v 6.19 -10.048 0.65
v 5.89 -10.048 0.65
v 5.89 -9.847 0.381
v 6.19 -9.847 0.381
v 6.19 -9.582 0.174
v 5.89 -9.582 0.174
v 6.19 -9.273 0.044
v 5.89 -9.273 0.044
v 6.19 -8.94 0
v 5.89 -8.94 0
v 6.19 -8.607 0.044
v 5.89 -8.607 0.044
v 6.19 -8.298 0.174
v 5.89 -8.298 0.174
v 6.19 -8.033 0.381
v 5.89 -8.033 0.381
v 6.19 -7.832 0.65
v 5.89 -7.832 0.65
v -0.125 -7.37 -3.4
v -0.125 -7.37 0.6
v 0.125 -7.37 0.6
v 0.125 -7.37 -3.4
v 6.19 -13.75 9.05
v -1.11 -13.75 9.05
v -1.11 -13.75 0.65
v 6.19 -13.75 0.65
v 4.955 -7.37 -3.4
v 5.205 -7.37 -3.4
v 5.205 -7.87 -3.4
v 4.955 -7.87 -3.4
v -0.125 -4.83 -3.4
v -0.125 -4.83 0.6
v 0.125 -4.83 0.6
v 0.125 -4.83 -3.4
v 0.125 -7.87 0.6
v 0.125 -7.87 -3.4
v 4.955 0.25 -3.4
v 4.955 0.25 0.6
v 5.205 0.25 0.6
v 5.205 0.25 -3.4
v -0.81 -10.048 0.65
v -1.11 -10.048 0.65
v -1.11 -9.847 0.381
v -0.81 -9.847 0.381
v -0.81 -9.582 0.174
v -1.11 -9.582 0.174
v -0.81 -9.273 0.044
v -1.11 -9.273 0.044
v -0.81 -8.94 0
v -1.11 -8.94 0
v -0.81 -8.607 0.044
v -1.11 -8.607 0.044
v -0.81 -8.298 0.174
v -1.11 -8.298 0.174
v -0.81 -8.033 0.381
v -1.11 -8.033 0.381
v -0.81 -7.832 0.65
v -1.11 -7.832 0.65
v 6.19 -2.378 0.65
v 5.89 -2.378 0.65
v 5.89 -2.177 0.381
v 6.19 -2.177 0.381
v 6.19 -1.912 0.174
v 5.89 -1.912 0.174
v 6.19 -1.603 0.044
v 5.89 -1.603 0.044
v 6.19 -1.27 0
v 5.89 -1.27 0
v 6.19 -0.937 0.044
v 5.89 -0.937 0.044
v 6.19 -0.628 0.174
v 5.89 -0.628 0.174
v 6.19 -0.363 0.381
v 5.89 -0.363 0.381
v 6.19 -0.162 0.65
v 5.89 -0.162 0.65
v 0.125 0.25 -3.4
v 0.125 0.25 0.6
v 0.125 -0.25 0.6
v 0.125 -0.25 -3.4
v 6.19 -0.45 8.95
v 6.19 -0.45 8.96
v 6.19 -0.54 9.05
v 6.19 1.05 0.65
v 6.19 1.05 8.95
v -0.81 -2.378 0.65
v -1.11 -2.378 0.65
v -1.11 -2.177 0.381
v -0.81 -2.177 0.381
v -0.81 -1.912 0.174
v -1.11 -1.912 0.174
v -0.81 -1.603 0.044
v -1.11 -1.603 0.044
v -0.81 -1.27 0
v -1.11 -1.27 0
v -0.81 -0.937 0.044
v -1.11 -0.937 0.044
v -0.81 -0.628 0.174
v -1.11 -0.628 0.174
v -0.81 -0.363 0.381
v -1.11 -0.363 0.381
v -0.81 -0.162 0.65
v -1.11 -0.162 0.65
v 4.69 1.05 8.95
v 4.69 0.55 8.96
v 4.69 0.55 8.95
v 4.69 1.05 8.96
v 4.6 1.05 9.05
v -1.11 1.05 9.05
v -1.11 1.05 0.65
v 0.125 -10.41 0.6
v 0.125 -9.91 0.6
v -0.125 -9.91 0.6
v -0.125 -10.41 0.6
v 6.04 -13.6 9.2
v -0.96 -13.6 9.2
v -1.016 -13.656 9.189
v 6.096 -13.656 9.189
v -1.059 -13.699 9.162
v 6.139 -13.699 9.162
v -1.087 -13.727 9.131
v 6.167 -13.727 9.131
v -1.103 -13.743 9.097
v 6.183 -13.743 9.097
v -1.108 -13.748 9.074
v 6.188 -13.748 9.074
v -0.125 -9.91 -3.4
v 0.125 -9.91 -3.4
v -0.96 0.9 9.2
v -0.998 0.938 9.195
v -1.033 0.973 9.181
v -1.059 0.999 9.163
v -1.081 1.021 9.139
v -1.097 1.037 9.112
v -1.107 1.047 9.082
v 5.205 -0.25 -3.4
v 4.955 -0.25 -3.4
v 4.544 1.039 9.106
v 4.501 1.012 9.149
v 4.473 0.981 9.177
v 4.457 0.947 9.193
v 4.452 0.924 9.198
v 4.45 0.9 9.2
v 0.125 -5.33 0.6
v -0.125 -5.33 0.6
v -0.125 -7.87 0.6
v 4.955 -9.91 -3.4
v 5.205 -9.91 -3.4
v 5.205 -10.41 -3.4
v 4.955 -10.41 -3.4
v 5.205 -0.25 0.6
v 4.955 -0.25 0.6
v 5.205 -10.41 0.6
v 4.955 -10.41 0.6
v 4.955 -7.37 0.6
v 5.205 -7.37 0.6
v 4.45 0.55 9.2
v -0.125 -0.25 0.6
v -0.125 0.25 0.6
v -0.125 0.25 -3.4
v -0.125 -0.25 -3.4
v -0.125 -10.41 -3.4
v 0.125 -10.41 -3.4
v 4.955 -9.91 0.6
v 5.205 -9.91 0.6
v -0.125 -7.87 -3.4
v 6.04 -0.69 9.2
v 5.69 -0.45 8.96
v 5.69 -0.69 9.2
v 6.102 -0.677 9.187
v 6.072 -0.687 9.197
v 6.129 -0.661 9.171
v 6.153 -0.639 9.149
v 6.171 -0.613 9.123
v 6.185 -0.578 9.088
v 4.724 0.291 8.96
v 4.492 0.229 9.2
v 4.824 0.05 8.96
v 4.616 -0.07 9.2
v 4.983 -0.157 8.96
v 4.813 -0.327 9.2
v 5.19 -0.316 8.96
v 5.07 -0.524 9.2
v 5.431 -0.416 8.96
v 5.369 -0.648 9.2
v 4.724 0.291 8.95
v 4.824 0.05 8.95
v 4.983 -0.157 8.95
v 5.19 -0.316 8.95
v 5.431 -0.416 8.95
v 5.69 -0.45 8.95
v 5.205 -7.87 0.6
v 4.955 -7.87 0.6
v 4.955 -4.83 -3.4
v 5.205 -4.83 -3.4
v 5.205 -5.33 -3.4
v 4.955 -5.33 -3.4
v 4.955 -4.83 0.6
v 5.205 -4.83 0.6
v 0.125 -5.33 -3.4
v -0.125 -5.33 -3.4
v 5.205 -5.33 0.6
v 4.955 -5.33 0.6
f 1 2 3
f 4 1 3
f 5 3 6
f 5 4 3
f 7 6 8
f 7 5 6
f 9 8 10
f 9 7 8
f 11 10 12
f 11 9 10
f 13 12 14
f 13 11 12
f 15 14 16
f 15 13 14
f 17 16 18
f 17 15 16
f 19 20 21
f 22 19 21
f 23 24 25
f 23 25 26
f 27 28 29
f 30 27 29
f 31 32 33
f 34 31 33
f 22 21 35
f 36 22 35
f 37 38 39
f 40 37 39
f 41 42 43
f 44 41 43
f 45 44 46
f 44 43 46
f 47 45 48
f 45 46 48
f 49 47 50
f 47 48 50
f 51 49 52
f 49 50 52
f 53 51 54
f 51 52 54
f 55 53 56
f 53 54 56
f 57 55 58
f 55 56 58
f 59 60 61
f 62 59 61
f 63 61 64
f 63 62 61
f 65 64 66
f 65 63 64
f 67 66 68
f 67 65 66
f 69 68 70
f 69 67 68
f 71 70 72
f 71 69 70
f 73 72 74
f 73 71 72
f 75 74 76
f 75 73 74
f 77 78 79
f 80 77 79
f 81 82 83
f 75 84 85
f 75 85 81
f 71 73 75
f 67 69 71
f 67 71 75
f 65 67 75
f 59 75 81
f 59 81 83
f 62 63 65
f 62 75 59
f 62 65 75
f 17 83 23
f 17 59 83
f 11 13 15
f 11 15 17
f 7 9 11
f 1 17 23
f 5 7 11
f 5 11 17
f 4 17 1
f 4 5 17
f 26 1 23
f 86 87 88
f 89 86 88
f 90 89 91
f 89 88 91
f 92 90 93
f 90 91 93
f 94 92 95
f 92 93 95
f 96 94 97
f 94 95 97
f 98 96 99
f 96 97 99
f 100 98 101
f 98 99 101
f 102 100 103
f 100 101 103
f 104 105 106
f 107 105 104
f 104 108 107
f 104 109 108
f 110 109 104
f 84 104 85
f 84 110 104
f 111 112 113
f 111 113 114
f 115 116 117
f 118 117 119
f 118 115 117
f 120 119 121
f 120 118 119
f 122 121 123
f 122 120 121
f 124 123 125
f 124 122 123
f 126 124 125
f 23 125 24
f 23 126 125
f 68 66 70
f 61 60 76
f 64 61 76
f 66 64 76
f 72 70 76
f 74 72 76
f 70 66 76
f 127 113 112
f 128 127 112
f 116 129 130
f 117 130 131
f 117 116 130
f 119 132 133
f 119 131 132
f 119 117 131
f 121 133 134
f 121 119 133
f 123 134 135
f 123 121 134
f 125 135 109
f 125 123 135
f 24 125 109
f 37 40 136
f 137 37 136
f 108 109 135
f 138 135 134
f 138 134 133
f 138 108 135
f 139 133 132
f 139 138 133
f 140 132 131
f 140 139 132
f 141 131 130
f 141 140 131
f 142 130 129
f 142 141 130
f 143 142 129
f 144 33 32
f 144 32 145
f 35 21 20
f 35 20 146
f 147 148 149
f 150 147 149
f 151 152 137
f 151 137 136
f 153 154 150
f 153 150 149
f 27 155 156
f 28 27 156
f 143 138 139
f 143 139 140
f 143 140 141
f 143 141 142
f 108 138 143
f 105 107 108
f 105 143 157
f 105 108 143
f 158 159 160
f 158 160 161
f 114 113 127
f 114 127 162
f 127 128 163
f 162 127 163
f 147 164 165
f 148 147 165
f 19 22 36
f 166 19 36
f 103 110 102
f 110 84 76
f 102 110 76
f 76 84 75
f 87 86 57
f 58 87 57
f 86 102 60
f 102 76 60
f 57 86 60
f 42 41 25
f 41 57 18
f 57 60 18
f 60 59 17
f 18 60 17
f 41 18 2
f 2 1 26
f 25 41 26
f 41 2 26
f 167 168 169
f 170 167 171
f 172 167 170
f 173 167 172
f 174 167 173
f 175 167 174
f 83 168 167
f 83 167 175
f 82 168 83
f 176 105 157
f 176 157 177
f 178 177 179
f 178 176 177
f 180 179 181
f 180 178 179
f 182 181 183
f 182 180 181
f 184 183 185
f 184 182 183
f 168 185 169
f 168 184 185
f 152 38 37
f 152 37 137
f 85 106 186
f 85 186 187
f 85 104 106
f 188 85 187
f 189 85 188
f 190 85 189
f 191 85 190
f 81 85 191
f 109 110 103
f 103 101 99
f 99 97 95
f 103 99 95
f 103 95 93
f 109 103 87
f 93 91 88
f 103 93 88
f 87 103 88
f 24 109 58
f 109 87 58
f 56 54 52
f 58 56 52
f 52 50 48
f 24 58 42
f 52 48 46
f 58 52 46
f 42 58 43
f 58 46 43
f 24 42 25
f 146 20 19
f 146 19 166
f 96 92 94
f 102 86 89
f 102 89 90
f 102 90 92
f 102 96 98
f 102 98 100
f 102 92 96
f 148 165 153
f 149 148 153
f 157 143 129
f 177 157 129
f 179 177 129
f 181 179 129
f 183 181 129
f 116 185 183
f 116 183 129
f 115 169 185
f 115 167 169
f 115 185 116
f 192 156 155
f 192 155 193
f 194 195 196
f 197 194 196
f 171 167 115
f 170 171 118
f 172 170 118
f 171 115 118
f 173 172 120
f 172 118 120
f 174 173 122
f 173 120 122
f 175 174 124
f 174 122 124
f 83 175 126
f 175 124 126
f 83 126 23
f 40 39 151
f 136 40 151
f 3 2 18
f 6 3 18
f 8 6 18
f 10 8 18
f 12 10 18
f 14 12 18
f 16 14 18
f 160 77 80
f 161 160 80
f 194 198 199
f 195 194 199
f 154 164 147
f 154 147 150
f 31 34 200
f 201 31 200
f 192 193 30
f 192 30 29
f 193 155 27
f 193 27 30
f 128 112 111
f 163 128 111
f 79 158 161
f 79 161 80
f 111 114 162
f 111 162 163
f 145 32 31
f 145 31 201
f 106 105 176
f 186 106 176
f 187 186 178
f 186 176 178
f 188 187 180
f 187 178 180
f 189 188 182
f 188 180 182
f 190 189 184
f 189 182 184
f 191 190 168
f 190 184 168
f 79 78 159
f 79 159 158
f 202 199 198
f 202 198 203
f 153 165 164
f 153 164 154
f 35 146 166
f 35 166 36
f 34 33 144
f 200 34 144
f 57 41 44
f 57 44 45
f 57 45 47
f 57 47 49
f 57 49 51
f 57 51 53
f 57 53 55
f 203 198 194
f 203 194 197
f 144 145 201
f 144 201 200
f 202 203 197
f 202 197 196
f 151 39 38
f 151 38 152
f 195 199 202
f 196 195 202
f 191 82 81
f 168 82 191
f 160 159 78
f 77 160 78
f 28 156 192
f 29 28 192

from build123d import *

# Parameters (mm, degrees)
PAD002_DEPTH = 0.3
SKETCH_W     = 14.8
SKETCH_H     = 7.3
PAD_DEPTH    = 8.55
POCKET_DEPTH = 0.25
CHAMFER_SIZE = 0.24
FILLET_R     = 0.15
SKETCH001_W  = 0.5
SKETCH001_H  = 0.25
PAD001_DEPTH = 4
PAD003_DEPTH = 0.3


with BuildPart() as pad002:
    # Sketch003 → Pad002 (new body)
    with BuildSketch(Plane.YZ.offset(6.19)):
        with BuildLine():
            ThreePointArc((-10.21, 1.27), (-8.94, 0), (-7.67, 1.27))
            Line((-10.21, 1.27), (-7.67, 1.27))
        make_face()
        with BuildLine():
            ThreePointArc((-2.54, 1.27), (-1.27, 0), (0, 1.27))
            Line((-2.54, 1.27), (0, 1.27))
        make_face()
    extrude(amount=-PAD002_DEPTH)


with BuildPart() as fillet_body:
    # Sketch → Pad (new body)
    with BuildSketch(Plane(origin=(0, 0, 0.65), x_dir=(0, -1, 0), z_dir=(0, 0, 1))):
        with Locations((6.35, 2.54)):
            Rectangle(SKETCH_W, SKETCH_H)
    extrude(amount=PAD_DEPTH)

    # Sketch002 → Pocket (cut)
    with BuildSketch(Plane(origin=(0, 0, 9.2), x_dir=(0, -1, 0), z_dir=(0, 0, 1))):
        with BuildLine():
            ThreePointArc((-0.55, 4.69), (0.157107, 4.982893), (0.45, 5.690001))
            Line((0.45, 6.19), (0.45, 5.690001))
            Line((-1.05, 6.19), (0.45, 6.19))
            Line((-1.05, 4.69), (-1.05, 6.19))
            Line((-0.55, 4.69), (-1.05, 4.69))
        make_face()
    extrude(amount=-POCKET_DEPTH, mode=Mode.SUBTRACT)

    # Chamfer
    chamfer_edges = [fillet_body.edges().sort_by_distance(p)[0] for p in [
        (4.982893, -0.157107, 9.2),
        (5.94, -0.45, 9.2),
        (4.69, 0.8, 9.2),
    ]]
    chamfer(chamfer_edges, length=CHAMFER_SIZE)

    # Fillet
    fillet_edges = [fillet_body.edges().sort_by_distance(p)[0] for p in [
        (6.19, -7.22, 9.2),
        (1.67, 1.05, 9.2),
        (-1.11, -6.35, 9.2),
        (2.54, -13.75, 9.2),
    ]]
    fillet(fillet_edges, radius=FILLET_R)


with BuildPart() as pad001:
    # Sketch001 → Pad001 (new body)
    with BuildSketch(Plane(origin=(0, 0, 0.6), x_dir=(0, -1, 0), z_dir=(0, 0, 1))):
        Rectangle(SKETCH001_W, SKETCH001_H)
        with Locations((5.08, 0)):
            Rectangle(SKETCH001_W, SKETCH001_H)
        with Locations((0, 5.08)):
            Rectangle(SKETCH001_W, SKETCH001_H)
        with Locations((5.08, 5.08)):
            Rectangle(SKETCH001_W, SKETCH001_H)
        with Locations((7.62, 0)):
            Rectangle(SKETCH001_W, SKETCH001_H)
        with Locations((7.62, 5.08)):
            Rectangle(SKETCH001_W, SKETCH001_H)
        with Locations((10.16, 5.08)):
            Rectangle(SKETCH001_W, SKETCH001_H)
        with Locations((10.16, 0)):
            Rectangle(SKETCH001_W, SKETCH001_H)
    extrude(amount=-PAD001_DEPTH)


with BuildPart() as pad003_mp_cp:
    # Sketch004 → Pad003 (new body)
    with BuildSketch(Plane.YZ.offset(-1.11)):
        with BuildLine():
            ThreePointArc((-10.21, 1.27), (-8.94, 0), (-7.67, 1.27))
            Line((-10.21, 1.27), (-7.67, 1.27))
        make_face()
        with BuildLine():
            ThreePointArc((-2.54, 1.27), (-1.27, 0), (0, 1.27))
            Line((-2.54, 1.27), (0, 1.27))
        make_face()
    extrude(amount=PAD003_DEPTH)

    # Pad003_mp_cp: union Pad002, Fillet body, Pad001
    add(pad002.part)
    add(fillet_body.part)
    add(pad001.part)


solid = pad003_mp_cp.part
